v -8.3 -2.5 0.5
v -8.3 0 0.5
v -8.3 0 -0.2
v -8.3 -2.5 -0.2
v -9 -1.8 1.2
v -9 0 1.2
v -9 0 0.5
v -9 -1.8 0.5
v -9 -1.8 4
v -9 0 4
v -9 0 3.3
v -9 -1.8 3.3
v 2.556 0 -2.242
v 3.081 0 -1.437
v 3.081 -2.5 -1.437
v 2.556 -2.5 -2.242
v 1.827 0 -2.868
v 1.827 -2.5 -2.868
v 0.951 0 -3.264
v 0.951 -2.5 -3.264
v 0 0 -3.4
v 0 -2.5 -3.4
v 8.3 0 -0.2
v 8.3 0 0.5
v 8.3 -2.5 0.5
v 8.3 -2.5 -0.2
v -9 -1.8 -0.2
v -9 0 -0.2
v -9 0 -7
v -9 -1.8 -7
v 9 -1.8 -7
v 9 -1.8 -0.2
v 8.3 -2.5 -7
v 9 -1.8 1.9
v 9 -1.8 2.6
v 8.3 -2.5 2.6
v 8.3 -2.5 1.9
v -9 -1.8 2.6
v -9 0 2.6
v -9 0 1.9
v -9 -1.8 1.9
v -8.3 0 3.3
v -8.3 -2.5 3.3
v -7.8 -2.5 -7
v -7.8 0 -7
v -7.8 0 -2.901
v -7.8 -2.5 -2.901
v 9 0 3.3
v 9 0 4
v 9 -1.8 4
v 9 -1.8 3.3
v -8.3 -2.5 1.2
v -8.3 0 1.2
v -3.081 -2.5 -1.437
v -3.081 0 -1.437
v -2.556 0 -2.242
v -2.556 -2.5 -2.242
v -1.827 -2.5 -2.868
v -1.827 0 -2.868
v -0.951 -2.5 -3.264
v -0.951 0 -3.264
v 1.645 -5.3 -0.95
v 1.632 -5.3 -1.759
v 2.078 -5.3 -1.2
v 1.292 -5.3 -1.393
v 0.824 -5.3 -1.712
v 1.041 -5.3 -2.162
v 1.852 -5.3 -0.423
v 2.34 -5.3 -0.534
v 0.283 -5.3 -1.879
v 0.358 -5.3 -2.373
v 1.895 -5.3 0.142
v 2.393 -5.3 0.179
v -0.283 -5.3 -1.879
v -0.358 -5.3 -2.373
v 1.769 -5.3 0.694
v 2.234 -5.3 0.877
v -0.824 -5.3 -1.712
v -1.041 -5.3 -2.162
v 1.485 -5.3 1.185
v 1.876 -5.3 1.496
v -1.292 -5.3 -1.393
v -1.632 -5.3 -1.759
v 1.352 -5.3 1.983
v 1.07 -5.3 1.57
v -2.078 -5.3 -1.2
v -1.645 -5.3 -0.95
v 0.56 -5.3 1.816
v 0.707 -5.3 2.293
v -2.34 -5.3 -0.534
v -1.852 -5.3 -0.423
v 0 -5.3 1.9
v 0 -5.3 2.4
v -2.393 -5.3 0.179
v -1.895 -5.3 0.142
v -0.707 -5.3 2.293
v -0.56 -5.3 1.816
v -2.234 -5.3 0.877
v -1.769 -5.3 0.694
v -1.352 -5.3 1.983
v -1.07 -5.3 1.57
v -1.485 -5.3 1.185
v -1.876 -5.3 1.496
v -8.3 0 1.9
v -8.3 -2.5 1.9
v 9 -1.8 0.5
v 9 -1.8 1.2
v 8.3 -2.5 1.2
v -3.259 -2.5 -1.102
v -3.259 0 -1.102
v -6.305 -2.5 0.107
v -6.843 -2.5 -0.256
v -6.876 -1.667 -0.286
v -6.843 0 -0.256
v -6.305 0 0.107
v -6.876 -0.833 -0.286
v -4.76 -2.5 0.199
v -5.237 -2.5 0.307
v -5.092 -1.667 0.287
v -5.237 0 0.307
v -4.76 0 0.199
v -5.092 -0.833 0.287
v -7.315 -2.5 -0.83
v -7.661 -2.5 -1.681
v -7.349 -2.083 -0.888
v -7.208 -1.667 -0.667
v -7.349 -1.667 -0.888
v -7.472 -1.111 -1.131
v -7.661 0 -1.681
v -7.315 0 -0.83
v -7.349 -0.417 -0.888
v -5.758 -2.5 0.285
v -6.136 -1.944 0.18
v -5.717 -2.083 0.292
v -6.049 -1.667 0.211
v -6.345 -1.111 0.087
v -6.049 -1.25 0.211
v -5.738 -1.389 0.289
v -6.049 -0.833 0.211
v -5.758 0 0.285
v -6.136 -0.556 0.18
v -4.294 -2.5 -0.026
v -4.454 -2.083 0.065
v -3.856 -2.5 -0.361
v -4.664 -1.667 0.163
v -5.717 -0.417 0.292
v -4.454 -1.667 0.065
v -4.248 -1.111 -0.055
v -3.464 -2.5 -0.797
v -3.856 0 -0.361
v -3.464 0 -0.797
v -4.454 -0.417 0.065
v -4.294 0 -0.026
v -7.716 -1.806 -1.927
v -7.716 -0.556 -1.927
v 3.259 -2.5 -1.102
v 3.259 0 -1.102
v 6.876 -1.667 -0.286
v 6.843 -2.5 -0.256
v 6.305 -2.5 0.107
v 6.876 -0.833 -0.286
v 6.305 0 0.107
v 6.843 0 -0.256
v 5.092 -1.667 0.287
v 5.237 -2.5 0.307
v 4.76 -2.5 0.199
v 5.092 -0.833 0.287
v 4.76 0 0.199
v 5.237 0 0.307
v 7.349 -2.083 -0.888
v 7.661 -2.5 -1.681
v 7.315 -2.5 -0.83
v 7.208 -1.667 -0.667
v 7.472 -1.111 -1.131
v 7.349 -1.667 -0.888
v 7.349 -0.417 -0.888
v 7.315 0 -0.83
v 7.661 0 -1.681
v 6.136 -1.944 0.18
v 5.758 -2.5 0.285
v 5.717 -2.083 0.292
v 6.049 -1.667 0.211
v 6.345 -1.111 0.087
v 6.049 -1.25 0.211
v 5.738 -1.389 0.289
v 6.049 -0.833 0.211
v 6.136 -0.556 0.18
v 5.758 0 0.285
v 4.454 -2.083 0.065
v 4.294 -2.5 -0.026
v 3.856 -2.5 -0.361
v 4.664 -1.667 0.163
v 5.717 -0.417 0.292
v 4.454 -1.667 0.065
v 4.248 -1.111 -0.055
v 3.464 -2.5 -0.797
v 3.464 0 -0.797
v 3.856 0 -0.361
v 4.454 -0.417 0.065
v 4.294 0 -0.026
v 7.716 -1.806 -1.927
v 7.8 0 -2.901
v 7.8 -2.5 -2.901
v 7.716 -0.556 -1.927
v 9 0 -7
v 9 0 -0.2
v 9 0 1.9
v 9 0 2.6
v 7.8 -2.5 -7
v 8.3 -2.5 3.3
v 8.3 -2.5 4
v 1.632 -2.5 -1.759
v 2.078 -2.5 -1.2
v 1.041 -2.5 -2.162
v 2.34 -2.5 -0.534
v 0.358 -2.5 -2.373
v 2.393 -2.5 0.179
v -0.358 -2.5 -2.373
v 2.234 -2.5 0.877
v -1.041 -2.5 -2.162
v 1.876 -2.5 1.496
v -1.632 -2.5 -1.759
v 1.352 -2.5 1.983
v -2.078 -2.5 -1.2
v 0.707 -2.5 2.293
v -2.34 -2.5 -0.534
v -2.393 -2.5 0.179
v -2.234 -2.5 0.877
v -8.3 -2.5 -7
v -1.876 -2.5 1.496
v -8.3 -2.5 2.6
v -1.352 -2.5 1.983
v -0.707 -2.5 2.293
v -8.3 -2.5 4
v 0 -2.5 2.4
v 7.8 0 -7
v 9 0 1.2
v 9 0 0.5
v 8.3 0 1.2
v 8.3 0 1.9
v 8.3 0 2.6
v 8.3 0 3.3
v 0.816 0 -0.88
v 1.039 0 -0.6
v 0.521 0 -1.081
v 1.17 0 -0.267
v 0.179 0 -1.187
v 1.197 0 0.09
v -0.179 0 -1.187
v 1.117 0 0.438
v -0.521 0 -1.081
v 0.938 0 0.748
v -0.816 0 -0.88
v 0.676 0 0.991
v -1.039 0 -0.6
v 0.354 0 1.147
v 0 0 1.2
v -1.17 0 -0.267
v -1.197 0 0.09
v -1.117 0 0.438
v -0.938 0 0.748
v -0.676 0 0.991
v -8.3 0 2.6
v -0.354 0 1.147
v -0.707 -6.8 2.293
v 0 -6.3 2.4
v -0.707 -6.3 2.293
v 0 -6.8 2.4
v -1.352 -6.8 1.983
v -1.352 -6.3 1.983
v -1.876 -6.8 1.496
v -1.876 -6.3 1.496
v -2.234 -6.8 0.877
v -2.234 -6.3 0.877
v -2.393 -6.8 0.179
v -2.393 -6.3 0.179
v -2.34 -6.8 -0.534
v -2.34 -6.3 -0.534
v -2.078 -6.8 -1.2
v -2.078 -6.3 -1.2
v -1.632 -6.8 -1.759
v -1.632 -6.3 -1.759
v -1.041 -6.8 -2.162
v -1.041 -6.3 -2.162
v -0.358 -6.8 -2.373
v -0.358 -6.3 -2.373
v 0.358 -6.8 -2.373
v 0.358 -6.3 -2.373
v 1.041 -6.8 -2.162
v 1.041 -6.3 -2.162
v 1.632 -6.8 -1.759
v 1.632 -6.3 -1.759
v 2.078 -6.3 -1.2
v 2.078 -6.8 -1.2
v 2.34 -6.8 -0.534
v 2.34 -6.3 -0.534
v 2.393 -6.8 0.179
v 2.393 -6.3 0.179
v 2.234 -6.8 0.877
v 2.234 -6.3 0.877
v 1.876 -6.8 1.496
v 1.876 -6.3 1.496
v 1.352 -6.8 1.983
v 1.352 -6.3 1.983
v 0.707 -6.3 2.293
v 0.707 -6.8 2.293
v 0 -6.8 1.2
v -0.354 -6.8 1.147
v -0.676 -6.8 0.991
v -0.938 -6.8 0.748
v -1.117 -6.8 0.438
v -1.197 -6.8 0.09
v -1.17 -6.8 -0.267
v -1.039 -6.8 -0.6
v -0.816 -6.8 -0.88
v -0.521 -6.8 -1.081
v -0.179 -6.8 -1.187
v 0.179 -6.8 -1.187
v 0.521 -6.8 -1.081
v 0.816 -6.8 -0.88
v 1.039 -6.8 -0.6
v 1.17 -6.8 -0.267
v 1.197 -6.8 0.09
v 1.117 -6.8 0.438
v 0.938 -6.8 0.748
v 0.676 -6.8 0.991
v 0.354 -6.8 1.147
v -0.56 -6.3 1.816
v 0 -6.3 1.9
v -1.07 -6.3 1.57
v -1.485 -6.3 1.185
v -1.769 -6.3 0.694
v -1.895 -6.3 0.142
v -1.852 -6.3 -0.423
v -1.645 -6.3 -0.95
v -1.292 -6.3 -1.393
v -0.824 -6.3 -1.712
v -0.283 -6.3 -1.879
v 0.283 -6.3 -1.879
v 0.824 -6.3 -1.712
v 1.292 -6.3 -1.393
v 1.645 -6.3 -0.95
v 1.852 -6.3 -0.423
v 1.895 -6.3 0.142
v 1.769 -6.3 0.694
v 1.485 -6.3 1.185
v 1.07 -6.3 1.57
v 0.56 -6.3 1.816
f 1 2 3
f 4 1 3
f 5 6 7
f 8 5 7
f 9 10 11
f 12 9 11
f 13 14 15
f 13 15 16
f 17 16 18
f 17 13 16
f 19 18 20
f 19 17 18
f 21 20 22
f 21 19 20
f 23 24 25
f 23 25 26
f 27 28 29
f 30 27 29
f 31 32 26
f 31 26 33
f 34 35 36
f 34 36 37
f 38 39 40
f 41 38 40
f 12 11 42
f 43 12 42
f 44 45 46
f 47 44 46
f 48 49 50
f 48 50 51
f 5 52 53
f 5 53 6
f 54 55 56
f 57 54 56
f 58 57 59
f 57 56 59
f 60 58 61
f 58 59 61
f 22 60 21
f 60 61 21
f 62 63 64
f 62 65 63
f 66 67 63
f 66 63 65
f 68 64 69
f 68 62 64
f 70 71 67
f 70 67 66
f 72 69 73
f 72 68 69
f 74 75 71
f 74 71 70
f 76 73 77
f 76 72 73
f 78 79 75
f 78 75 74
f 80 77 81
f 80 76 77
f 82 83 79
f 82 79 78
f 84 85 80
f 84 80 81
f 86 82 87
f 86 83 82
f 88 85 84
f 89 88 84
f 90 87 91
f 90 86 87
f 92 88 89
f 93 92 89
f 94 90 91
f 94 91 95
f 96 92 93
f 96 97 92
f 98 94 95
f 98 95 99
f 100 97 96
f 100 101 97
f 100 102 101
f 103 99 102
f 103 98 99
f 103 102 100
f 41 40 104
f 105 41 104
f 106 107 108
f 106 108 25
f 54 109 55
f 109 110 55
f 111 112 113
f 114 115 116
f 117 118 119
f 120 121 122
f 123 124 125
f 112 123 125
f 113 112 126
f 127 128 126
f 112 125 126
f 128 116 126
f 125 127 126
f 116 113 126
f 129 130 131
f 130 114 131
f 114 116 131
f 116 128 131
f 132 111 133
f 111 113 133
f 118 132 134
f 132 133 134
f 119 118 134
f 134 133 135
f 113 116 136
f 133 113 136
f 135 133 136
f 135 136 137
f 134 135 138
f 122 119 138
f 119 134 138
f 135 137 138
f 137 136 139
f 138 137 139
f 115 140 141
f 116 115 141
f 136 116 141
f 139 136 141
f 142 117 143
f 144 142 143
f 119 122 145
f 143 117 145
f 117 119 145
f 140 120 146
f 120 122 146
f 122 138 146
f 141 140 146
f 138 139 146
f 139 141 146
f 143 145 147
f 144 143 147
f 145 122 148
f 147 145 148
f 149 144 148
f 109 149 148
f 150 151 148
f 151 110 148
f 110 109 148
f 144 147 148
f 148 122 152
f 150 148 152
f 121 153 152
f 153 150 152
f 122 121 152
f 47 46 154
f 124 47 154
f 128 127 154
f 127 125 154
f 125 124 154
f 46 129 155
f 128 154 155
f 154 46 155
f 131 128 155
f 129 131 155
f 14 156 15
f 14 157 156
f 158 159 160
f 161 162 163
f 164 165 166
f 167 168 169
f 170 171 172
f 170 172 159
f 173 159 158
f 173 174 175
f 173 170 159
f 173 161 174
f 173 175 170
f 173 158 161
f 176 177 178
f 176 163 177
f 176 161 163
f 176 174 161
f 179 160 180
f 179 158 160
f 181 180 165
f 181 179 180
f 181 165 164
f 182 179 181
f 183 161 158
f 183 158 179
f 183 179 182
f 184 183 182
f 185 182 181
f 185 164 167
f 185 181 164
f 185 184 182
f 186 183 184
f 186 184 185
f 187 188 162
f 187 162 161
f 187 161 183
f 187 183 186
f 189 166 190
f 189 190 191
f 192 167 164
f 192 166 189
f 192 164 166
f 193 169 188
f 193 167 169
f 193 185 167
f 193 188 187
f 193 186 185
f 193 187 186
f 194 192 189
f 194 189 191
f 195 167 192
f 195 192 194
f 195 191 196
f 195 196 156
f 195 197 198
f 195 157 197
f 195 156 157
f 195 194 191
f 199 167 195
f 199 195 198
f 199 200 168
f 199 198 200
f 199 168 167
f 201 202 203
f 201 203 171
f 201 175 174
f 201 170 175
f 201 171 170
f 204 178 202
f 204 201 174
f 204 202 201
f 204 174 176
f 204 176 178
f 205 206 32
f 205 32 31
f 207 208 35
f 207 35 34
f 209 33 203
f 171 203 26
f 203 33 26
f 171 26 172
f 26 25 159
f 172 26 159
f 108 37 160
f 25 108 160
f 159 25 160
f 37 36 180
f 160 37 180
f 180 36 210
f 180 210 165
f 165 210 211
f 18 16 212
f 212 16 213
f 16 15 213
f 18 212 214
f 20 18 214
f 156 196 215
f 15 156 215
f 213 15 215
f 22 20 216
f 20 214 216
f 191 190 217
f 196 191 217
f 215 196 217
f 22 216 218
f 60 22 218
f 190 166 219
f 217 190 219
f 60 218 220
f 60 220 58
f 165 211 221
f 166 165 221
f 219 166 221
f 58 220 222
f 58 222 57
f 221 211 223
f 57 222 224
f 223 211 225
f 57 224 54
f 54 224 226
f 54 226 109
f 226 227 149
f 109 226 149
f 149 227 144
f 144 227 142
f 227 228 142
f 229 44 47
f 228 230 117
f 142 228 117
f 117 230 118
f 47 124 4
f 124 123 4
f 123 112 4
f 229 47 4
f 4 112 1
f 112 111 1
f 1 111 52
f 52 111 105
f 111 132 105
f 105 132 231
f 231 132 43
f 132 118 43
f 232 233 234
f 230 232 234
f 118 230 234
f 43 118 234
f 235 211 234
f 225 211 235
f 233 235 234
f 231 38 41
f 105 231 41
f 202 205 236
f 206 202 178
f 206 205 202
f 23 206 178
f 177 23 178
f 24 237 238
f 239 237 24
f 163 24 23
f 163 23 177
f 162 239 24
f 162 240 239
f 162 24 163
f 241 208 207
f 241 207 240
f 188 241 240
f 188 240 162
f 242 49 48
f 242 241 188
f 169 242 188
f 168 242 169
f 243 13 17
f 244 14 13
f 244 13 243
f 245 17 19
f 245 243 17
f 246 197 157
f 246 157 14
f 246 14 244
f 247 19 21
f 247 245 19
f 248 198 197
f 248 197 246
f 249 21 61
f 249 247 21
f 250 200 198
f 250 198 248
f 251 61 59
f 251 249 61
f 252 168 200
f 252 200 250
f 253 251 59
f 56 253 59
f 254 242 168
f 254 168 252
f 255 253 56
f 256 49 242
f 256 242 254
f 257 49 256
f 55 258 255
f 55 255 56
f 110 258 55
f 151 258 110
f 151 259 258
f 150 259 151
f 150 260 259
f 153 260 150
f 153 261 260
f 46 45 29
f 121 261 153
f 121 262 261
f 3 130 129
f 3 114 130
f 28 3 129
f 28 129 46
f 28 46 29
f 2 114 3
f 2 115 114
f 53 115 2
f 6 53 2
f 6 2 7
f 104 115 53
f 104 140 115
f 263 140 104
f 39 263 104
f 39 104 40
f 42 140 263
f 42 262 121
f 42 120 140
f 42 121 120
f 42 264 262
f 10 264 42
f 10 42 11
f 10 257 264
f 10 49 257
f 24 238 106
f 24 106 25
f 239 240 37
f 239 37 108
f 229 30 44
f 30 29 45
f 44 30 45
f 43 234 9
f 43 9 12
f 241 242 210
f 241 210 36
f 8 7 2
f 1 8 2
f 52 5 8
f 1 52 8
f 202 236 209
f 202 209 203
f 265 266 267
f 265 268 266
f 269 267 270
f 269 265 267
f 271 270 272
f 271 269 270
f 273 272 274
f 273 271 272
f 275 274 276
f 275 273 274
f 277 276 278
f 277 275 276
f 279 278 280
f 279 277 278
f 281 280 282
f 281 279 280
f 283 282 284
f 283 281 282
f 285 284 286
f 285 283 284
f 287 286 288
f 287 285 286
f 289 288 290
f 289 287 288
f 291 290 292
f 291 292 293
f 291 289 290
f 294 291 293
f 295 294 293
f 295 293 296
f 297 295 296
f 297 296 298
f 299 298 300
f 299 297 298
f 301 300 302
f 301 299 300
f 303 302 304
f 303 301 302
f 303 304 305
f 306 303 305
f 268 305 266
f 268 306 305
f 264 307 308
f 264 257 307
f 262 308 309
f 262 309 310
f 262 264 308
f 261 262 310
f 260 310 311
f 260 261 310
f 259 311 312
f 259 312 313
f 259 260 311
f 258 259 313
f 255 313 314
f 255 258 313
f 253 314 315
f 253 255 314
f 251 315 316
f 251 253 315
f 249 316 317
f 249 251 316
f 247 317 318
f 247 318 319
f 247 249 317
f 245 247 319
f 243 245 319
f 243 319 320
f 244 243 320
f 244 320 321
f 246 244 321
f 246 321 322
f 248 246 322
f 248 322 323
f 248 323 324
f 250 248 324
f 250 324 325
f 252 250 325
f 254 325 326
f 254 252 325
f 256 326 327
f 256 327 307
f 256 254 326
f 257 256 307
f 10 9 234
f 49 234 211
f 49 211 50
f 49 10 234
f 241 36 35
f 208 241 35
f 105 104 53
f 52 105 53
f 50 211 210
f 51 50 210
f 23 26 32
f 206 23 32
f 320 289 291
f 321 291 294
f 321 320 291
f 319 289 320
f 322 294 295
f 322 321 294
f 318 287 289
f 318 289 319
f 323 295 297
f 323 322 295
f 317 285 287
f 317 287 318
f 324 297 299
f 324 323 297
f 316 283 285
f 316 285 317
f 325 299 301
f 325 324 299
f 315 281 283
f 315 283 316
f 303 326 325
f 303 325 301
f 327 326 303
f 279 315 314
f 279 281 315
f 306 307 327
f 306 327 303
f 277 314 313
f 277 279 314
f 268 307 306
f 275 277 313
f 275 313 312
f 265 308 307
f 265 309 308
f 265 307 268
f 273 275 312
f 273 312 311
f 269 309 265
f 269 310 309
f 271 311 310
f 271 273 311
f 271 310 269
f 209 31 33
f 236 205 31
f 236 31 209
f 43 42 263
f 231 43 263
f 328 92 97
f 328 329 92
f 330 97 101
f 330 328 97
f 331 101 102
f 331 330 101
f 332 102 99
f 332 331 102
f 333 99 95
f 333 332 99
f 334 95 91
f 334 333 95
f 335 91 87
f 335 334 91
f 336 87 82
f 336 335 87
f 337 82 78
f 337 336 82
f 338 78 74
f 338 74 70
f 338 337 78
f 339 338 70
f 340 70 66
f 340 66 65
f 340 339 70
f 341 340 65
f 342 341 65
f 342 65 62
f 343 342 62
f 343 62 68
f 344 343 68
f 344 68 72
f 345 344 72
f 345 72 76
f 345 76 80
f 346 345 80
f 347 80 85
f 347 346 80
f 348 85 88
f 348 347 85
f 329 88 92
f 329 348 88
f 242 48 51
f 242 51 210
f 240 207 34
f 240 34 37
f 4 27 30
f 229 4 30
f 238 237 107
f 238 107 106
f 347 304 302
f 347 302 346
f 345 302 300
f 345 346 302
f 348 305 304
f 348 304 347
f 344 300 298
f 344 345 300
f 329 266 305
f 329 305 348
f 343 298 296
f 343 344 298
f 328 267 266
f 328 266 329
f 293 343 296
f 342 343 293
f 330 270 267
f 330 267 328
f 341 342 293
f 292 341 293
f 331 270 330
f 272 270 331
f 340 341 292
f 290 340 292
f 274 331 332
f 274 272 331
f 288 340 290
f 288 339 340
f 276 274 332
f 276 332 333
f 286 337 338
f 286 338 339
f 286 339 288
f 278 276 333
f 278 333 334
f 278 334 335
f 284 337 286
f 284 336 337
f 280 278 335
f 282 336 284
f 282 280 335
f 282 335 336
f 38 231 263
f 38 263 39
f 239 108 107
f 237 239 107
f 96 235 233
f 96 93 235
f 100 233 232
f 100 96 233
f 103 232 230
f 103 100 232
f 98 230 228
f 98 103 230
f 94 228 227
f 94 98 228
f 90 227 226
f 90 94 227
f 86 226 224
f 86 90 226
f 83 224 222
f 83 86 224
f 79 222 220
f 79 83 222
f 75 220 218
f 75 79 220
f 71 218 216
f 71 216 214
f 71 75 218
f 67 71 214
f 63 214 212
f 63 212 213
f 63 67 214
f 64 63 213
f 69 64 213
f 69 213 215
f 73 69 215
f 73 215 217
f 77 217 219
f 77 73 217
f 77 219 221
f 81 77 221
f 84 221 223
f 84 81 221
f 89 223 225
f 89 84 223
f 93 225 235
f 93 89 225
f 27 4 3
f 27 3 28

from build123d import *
from build123d import SkipClean  # not in build123d's __all__

# Parameters (mm, degrees)
F1_DEPTH = 2.5
F4_SIZE  = 0.7
F3_W     = 2.5
F3_H     = 1.2


with BuildPart() as f1:
    # F0 (on Front) → F1 (new body)
    with BuildSketch(Plane.XZ):
        with BuildLine():
            Line((0, 4), (-9, 4))
            Line((-9, 4), (-9, 3.3))
            Line((-9, 3.3), (-8.3, 3.3))
            Line((-8.3, 3.3), (-8.3, 2.6))
            Line((-8.3, 2.6), (-9, 2.6))
            Line((-9, 2.6), (-9, 1.9))
            Line((-9, 1.9), (-8.3, 1.9))
            Line((-8.3, 1.9), (-8.3, 1.2))
            Line((-8.3, 1.2), (-9, 1.2))
            Line((-9, 1.2), (-9, 0.5))
            Line((-9, 0.5), (-8.3, 0.5))
            Line((-8.3, 0.5), (-8.3, -0.2))
            Line((-8.3, -0.2), (-9, -0.2))
            Line((-9, -0.2), (-9, -7))
            Line((-9, -7), (-7.8, -7))
            Line((-7.8, -7), (-7.8, -2.900873477))
            add(Edge.make_bspline(
                [(-7.8, -2.900873477), (-7.8, -1.685574969), (-7.1826716424, -0.1281665724), (-4.9759016066, 0.6847768295), (-3.5267368498, -0.4819738014), (-3.0814464759, -1.4369020899)],
                knots=[0, 0, 0, 0, 0.3572792207, 0.6508868549, 1, 1, 1, 1], degree=3))
            ThreePointArc((-3.0814464759, -1.4369020899), (-1.8268186684, -2.8675309158), (0, -3.4))
            Line((0, -3.4), (0, -2.4))
            ThreePointArc((0, -2.4), (-2.4, 0), (0, 2.4))
            Line((0, 2.4), (0, 4))
        make_face()
    extrude(amount=F1_DEPTH)

    # F2: F1 across plane


with BuildPart() as f1_1:
    add(f1.part, clean=False)
    with SkipClean():  # cleaning this boolean's faces spoils the solid; the shape is the same uncleaned
        add(f1.part.mirror(Plane.YZ), clean=False)

    # F4
    f4_edges = [f1_1.edges().sort_by_distance(p)[0] for p in [
        (-9, -2.5, -3.6),
        (9, -2.5, -3.6),
        (-9, -2.5, 3.65),
        (-9, -2.5, 2.25),
        (-9, -2.5, 0.85),
        (9, -2.5, 3.65),
        (9, -2.5, 2.25),
        (9, -2.5, 0.85),
    ]]
    chamfer(f4_edges, length=F4_SIZE)

    # F3 (on Right) → F5 (revolve)
    with BuildSketch(Plane.YZ):
        Polygon((-2.5, 1.2), (-2.5, 2.4), (-5.3, 2.4), (-5.3, 1.9), (-6.3, 1.9), (-6.3, 2.4), (-6.8, 2.4), (-6.8, 1.2), align=None)
        with Locations((-1.25, 1.8)):
            Rectangle(F3_W, F3_H)
    revolve(axis=Axis((0, -3.9747959284, 0), (0, -1, 0)))


solid = f1_1.part
